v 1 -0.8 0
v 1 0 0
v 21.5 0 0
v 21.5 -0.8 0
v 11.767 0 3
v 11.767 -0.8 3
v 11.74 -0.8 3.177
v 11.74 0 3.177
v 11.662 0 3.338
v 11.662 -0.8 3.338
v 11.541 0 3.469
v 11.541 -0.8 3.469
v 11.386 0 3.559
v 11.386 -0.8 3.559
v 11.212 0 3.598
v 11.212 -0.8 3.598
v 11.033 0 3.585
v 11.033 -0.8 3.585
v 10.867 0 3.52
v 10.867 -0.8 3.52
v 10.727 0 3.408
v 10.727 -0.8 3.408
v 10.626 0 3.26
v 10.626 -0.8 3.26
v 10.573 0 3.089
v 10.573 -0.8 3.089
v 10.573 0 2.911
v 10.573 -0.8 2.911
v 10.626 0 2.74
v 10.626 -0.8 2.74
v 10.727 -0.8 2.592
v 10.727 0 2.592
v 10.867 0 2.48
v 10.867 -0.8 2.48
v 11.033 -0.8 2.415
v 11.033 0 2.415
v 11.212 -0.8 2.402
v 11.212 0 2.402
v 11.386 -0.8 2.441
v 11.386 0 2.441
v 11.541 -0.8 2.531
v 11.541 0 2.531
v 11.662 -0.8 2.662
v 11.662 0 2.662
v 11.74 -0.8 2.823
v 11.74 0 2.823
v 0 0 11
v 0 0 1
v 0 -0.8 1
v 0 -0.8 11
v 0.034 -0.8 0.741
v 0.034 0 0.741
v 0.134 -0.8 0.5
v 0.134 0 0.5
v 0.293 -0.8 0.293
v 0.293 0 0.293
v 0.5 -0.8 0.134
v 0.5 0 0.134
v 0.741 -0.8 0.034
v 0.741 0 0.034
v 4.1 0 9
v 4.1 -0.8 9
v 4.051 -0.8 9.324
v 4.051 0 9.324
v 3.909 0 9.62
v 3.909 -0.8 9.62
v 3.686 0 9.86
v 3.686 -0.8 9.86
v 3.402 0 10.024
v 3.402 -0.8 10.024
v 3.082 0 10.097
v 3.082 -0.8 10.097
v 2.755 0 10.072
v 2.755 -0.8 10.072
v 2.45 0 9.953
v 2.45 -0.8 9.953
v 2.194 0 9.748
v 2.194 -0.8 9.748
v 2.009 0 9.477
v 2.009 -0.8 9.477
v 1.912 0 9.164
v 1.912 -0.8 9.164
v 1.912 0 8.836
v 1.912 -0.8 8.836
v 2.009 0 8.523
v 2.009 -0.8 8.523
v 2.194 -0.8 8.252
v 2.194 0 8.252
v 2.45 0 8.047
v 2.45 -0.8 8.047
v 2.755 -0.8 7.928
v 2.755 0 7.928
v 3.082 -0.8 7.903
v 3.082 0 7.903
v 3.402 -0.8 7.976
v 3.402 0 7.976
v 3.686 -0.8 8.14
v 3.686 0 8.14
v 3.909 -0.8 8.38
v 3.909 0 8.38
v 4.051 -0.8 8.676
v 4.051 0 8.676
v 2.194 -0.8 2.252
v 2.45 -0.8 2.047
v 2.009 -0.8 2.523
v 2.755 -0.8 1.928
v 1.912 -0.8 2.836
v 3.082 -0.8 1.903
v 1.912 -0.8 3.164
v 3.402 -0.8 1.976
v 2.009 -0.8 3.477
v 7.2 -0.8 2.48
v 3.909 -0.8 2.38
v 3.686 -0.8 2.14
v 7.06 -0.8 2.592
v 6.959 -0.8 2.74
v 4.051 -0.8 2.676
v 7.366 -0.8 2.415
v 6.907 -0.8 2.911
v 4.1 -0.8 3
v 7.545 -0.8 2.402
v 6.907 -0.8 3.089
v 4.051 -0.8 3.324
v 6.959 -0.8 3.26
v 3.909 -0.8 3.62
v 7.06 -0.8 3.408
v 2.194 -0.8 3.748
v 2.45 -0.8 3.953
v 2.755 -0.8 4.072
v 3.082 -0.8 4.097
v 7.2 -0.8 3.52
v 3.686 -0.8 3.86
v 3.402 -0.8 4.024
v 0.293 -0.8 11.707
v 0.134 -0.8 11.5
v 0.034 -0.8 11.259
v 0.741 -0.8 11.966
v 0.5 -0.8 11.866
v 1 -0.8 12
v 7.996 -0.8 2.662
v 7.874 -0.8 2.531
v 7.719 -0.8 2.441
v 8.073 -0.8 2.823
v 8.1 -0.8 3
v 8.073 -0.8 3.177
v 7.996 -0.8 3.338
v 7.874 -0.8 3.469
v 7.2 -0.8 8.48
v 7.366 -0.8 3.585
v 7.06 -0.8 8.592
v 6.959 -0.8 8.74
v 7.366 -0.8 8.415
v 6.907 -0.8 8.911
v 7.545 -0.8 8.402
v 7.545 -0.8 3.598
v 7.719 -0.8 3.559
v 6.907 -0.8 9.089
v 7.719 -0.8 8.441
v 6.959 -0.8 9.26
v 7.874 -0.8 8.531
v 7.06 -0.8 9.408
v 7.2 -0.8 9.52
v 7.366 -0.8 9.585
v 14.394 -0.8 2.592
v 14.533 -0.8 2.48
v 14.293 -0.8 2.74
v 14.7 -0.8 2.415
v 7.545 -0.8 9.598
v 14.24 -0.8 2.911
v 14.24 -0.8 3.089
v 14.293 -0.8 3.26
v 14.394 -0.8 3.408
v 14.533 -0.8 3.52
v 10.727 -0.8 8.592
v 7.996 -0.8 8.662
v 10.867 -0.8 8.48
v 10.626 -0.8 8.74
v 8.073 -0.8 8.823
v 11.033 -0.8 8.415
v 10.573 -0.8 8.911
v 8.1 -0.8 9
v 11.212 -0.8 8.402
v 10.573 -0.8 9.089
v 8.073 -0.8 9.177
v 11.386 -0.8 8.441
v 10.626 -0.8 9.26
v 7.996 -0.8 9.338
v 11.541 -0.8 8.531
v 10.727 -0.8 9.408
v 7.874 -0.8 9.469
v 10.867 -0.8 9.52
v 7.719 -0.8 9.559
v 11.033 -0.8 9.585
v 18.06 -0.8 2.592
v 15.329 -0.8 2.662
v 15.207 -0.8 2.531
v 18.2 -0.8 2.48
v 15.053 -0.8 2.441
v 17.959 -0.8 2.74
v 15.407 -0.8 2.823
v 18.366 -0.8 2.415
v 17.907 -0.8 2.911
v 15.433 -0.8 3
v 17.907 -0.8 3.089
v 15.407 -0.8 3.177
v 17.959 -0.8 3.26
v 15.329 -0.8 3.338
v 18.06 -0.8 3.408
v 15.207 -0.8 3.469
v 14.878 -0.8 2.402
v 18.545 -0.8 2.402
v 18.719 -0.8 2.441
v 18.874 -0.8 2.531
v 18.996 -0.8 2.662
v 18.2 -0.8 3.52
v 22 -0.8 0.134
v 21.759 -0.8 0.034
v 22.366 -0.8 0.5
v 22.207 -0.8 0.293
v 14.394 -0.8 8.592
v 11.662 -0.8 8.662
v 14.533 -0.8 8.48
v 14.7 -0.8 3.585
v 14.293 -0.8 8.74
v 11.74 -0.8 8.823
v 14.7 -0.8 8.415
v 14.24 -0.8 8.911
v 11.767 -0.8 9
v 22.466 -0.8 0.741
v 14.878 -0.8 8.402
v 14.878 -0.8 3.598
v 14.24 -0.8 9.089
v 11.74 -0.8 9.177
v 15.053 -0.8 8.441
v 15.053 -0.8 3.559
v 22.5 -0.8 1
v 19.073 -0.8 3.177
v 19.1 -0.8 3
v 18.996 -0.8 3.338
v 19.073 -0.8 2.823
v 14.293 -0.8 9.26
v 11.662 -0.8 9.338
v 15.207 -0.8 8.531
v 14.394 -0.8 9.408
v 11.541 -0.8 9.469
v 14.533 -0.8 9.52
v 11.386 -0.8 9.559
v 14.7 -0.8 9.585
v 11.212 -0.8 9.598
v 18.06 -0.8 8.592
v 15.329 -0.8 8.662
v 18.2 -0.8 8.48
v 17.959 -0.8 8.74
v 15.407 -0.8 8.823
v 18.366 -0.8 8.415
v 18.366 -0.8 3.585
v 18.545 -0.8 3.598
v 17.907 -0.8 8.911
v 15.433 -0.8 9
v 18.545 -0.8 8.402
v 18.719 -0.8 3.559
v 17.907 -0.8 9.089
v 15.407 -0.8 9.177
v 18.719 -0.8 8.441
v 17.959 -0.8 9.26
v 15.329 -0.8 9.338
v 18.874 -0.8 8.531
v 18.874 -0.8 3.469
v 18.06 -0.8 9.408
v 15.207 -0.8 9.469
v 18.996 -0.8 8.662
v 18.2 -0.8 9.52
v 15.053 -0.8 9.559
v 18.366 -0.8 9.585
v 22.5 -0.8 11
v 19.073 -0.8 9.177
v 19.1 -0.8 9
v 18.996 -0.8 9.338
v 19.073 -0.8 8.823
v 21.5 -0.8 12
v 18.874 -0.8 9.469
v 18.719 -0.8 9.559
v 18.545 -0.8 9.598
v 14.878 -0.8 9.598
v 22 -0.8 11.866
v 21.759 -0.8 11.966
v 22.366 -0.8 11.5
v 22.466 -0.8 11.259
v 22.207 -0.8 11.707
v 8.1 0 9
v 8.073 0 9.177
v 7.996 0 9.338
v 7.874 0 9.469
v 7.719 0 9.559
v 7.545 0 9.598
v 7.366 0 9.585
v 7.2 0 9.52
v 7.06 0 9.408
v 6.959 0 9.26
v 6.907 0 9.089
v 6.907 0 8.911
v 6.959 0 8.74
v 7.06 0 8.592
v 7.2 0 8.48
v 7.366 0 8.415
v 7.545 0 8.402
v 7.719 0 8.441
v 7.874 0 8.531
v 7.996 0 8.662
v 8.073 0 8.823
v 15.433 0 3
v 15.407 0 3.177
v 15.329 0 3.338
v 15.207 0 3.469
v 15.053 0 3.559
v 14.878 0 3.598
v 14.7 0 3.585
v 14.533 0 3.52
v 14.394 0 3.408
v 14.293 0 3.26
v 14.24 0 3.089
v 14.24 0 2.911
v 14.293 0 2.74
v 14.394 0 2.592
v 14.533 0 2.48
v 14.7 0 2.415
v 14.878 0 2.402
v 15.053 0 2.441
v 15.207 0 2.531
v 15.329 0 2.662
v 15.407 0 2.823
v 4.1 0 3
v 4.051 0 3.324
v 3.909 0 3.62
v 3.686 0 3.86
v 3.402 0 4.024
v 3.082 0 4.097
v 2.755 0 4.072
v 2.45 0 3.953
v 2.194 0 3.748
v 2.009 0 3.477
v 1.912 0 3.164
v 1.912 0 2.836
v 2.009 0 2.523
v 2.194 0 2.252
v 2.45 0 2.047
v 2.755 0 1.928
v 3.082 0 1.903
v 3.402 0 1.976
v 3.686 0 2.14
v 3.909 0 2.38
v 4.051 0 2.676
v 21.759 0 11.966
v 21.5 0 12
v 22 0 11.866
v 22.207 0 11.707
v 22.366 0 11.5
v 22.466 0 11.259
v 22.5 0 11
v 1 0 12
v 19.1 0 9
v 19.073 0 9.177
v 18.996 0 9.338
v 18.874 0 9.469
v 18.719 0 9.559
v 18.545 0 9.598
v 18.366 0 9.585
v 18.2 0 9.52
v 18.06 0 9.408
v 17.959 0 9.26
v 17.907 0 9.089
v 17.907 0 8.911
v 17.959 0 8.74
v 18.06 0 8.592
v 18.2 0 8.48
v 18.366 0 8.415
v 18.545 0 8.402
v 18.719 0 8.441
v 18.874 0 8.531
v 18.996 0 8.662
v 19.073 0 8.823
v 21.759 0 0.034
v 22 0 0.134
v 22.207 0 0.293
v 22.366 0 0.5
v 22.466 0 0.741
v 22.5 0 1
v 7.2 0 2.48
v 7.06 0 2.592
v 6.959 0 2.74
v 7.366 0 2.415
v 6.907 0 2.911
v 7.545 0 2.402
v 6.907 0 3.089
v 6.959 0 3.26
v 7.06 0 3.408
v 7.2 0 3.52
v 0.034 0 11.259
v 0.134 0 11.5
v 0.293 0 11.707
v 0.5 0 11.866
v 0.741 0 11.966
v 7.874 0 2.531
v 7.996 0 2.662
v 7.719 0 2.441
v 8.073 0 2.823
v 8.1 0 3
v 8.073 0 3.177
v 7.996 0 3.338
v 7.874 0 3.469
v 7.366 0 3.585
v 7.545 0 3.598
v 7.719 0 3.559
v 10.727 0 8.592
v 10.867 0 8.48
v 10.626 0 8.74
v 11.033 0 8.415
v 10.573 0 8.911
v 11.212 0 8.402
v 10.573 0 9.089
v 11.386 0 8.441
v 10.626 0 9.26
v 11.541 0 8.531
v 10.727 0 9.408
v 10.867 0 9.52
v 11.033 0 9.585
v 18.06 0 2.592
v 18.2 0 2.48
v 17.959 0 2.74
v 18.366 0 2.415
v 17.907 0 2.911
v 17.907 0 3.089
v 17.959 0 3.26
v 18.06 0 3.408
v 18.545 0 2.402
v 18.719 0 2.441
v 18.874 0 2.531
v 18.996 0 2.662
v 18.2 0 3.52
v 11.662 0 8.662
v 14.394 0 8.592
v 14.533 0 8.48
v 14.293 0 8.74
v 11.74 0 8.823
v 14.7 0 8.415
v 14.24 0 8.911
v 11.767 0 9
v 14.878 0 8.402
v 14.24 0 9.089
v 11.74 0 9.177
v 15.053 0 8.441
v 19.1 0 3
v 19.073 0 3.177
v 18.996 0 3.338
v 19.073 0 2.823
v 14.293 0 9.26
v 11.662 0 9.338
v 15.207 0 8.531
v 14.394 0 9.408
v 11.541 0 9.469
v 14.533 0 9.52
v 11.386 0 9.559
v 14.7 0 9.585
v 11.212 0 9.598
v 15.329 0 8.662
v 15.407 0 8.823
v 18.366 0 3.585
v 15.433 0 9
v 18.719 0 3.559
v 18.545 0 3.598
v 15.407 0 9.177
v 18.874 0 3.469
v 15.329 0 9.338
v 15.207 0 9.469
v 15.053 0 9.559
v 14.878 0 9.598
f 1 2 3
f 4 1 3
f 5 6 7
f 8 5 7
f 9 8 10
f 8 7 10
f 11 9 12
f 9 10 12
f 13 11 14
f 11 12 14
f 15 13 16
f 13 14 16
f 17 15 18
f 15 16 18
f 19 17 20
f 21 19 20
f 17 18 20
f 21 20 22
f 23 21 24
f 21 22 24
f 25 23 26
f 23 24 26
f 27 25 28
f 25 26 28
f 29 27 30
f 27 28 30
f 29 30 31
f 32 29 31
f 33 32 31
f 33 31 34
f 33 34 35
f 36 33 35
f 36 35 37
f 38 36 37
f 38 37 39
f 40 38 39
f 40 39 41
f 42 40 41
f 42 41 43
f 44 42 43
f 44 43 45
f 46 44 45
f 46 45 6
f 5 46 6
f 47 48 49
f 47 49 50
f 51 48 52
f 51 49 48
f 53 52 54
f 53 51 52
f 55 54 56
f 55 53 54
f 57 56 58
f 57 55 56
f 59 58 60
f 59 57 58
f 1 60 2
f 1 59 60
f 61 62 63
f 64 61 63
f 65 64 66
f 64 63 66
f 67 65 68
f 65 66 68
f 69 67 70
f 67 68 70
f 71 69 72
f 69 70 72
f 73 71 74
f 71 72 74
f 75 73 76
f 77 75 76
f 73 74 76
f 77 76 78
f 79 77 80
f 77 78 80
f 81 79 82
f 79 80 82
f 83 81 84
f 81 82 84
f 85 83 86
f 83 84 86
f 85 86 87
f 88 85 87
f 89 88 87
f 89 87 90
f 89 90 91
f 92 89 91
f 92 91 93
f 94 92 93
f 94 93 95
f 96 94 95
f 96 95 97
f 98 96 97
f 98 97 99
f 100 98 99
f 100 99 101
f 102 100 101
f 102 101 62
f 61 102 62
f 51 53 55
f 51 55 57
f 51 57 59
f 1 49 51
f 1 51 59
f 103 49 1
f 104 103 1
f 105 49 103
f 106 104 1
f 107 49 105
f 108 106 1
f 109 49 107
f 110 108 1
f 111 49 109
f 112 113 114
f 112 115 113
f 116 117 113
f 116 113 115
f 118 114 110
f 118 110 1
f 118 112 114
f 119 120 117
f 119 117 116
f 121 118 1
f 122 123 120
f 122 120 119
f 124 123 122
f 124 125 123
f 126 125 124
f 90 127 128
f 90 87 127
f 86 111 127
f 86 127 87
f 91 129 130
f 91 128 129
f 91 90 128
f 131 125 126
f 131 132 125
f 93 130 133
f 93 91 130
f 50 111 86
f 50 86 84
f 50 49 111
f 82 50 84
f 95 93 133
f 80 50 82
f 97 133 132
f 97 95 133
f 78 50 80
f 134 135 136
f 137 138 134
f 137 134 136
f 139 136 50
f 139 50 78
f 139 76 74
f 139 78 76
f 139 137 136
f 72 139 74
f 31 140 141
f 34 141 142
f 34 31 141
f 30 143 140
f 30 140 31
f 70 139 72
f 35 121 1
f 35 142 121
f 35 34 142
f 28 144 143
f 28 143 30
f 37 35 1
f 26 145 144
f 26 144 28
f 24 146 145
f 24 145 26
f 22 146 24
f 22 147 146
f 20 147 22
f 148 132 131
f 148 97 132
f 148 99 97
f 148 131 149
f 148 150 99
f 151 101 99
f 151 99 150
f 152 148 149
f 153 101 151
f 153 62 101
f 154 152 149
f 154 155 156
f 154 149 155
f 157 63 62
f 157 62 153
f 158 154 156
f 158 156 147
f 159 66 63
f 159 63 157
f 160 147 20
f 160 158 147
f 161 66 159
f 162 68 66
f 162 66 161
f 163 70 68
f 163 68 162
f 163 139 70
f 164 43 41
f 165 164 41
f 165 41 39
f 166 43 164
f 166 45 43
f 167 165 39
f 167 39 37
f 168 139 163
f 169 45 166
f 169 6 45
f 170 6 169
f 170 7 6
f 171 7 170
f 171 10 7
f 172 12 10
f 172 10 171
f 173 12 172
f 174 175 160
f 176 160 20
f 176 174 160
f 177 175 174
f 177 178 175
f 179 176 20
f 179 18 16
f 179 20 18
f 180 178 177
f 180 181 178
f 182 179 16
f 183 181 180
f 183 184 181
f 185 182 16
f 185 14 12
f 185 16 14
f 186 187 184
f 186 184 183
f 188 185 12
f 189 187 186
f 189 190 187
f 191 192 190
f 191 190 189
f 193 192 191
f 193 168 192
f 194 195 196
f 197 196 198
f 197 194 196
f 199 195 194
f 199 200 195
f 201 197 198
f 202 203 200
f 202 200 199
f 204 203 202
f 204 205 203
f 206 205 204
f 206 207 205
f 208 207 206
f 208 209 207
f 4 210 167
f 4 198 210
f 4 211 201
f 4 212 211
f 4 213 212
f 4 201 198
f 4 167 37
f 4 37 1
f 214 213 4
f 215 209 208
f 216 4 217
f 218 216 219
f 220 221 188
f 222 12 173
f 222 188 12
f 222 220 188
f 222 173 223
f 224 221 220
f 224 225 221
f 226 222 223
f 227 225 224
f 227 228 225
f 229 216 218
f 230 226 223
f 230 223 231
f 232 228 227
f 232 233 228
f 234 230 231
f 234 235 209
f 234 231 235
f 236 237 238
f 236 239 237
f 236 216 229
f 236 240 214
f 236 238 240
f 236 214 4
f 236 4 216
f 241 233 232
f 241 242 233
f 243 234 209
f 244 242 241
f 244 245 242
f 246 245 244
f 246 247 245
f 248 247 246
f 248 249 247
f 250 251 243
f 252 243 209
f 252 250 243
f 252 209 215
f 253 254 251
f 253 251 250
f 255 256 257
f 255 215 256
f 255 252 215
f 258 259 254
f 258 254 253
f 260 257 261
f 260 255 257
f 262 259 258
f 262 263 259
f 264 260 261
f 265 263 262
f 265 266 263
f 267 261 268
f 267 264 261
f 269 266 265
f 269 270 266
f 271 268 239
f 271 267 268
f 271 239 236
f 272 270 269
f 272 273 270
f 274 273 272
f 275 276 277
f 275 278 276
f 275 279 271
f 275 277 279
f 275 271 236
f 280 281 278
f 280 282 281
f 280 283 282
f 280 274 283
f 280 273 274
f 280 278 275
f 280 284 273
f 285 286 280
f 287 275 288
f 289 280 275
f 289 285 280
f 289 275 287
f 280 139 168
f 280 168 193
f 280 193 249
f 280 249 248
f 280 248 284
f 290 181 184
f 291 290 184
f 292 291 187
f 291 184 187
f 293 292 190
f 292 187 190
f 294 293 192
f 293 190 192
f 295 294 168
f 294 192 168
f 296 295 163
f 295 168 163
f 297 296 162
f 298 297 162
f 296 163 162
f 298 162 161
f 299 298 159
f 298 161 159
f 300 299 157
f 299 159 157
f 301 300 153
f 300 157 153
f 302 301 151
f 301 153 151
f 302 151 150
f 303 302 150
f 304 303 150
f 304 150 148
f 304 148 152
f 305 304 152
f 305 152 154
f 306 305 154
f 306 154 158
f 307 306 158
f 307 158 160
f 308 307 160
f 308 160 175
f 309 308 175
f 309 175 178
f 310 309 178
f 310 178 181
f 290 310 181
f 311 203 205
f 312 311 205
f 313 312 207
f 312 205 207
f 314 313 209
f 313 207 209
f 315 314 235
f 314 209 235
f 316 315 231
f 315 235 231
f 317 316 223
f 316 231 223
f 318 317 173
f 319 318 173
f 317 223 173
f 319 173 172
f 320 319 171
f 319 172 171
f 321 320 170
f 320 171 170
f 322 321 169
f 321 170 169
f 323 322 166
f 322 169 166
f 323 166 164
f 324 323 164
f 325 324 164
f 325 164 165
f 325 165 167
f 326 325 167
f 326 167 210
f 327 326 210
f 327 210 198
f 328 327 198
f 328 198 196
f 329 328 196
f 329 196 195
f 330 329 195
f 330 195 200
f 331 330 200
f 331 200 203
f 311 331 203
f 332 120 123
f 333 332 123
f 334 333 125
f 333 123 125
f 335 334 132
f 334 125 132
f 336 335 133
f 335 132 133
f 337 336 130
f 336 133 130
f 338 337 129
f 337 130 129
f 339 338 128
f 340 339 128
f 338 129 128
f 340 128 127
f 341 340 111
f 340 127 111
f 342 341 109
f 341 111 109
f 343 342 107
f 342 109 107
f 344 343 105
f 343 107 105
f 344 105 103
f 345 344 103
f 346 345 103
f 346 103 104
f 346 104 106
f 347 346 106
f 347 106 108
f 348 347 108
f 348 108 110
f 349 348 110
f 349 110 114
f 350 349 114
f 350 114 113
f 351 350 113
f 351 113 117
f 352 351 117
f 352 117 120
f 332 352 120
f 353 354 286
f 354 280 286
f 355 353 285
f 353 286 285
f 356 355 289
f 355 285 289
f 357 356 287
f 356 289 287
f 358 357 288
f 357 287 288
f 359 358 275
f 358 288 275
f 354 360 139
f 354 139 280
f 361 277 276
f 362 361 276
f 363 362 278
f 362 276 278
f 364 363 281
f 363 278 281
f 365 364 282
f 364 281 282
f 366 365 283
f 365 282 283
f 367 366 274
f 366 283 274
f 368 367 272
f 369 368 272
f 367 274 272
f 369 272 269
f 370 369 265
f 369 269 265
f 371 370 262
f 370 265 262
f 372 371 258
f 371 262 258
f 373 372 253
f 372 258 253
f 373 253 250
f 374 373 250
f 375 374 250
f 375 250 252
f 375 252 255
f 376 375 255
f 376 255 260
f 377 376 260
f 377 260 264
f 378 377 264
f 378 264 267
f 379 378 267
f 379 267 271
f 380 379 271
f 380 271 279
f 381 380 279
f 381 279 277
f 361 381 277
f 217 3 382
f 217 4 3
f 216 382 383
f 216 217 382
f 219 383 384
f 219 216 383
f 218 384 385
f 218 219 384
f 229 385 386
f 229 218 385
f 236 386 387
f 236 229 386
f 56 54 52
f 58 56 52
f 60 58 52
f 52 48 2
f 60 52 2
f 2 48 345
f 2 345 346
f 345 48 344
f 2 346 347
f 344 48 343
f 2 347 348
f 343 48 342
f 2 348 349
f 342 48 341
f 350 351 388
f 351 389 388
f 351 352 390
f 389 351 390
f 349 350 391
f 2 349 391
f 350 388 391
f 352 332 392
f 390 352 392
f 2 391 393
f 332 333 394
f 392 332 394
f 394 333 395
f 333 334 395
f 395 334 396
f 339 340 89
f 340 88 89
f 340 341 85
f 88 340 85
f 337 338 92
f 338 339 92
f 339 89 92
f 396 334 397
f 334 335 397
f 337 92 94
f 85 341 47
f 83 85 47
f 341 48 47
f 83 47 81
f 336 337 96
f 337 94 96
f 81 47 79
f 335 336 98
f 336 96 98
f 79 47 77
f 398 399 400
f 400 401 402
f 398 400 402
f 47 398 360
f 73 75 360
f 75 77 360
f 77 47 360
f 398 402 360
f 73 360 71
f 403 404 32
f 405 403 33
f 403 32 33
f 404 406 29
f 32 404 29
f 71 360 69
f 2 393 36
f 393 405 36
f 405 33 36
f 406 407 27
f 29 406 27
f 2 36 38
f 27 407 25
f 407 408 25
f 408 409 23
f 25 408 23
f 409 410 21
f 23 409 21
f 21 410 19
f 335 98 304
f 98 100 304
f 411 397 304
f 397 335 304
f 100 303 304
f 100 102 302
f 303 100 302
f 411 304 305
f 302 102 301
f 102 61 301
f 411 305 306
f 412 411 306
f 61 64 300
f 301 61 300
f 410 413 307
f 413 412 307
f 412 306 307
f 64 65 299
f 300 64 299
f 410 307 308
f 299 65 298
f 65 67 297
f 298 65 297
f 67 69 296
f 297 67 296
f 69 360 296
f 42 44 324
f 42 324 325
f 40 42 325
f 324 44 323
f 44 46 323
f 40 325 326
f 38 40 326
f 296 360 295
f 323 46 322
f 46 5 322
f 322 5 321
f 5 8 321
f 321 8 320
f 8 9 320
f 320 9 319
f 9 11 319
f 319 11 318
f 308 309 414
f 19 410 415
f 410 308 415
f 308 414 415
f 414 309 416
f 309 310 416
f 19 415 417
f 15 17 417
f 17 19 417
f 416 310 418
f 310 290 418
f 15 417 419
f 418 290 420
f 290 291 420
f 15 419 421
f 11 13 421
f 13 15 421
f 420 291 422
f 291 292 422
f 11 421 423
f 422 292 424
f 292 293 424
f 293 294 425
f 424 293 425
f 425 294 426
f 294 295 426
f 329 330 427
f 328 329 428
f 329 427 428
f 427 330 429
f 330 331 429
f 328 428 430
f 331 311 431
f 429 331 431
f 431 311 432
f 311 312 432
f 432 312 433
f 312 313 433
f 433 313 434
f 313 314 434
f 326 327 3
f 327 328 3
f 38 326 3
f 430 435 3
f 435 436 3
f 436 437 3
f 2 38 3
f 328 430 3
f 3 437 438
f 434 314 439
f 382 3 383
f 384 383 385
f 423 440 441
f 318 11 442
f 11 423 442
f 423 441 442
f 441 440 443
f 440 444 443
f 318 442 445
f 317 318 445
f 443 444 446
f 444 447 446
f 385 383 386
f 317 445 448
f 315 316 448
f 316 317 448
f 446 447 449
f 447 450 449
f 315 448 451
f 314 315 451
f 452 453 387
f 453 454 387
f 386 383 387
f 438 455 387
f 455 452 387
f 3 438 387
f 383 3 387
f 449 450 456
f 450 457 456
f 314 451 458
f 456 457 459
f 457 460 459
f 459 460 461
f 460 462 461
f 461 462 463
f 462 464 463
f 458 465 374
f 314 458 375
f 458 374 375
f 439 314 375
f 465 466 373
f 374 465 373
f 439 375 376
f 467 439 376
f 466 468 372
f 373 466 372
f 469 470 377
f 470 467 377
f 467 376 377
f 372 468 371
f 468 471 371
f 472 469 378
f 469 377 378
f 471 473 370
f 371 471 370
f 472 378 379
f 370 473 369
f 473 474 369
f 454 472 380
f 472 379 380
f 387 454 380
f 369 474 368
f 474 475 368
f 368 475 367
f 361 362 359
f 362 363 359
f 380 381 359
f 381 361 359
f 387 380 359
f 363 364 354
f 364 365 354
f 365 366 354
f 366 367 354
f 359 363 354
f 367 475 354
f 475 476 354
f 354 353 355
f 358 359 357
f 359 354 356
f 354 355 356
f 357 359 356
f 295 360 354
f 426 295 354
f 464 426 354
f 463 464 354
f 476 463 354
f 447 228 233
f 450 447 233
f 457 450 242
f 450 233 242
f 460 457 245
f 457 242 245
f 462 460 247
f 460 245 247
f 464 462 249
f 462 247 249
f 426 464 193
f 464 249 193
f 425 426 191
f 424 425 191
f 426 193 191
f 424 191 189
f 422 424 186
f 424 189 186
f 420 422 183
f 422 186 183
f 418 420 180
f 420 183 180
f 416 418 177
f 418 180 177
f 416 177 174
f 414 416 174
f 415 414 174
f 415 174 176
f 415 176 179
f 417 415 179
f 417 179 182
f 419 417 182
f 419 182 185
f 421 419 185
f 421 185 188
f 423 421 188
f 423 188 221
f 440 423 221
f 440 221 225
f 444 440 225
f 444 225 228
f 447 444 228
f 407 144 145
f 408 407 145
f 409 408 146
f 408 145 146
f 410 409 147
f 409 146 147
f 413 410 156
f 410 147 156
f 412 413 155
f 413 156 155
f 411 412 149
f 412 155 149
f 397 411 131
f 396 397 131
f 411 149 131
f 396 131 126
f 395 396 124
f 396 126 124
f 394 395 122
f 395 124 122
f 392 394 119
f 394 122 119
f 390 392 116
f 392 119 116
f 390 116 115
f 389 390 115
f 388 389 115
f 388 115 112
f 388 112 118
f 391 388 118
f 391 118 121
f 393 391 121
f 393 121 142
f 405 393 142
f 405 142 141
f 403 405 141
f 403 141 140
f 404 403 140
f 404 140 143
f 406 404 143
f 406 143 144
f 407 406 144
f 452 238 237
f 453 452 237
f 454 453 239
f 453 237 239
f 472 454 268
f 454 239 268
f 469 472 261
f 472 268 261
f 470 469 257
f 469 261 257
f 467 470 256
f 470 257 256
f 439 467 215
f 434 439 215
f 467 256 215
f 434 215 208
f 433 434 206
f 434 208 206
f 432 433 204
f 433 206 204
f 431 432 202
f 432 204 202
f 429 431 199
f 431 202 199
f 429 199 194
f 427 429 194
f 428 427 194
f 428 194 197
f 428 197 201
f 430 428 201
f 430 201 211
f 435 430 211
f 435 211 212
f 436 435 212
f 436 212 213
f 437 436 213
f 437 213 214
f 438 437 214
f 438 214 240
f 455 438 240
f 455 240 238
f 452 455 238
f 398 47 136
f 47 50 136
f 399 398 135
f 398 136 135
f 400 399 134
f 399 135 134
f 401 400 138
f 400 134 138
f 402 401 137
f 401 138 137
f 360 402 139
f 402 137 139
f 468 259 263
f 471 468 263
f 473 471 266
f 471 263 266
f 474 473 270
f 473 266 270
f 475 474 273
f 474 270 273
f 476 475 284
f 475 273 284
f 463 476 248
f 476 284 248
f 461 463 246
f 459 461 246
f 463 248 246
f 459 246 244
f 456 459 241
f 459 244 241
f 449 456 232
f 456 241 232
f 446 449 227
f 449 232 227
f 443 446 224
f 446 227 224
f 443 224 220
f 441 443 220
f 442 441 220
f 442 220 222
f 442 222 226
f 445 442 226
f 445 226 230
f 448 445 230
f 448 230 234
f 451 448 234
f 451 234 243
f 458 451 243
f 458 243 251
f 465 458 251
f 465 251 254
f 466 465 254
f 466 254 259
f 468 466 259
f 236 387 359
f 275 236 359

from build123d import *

# Parameters (mm, degrees)
SKETCH_W            = 22.5
SKETCH_H            = 12
PAD_DEPTH           = 0.8
SKETCH001_R         = 1.1
POCKET_DEPTH        = 5
FILLET_R            = 1
SKETCH002_R         = 0.6
POCKET001_DEPTH     = 5
LINEARPATTERN_COUNT = 4
LINEARPATTERN_PITCH = 3.666667


with BuildPart() as part:
    # Sketch → Pad (new body)
    with BuildSketch(Plane.XZ):
        with Locations((11.25, 6)):
            Rectangle(SKETCH_W, SKETCH_H)
    extrude(amount=PAD_DEPTH)

    # Sketch001 (on Face6 of Pad) → Pocket (cut)
    with BuildSketch(Plane.XZ.offset(0.8)):
        with Locations((3, 9)):
            Circle(SKETCH001_R)
        with Locations((3, 3)):
            Circle(SKETCH001_R)
    extrude(amount=-POCKET_DEPTH, mode=Mode.SUBTRACT)

    # Fillet
    fillet_edges = [part.edges().sort_by_distance(p)[0] for p in [
        (0, -0.4, 12),
        (22.5, -0.4, 12),
        (22.5, -0.4, 0),
        (0, -0.4, 0),
    ]]
    fillet(fillet_edges, radius=FILLET_R)

    # Sketch002 (on Face5 of Fillet) → Pocket001 (cut)
    with BuildSketch(Plane.XZ.offset(0.8)):
        with Locations((7.5, 9)):
            Circle(SKETCH002_R)
        with Locations((7.5, 3)):
            Circle(SKETCH002_R)
    pocket001 = extrude(amount=-POCKET001_DEPTH, mode=Mode.SUBTRACT)

    # LinearPattern: Pocket001 ×4
    with Locations(*[(i * LINEARPATTERN_PITCH, 0, 0) for i in range(1, LINEARPATTERN_COUNT)]):
        add(pocket001, mode=Mode.SUBTRACT)


solid = part.part
